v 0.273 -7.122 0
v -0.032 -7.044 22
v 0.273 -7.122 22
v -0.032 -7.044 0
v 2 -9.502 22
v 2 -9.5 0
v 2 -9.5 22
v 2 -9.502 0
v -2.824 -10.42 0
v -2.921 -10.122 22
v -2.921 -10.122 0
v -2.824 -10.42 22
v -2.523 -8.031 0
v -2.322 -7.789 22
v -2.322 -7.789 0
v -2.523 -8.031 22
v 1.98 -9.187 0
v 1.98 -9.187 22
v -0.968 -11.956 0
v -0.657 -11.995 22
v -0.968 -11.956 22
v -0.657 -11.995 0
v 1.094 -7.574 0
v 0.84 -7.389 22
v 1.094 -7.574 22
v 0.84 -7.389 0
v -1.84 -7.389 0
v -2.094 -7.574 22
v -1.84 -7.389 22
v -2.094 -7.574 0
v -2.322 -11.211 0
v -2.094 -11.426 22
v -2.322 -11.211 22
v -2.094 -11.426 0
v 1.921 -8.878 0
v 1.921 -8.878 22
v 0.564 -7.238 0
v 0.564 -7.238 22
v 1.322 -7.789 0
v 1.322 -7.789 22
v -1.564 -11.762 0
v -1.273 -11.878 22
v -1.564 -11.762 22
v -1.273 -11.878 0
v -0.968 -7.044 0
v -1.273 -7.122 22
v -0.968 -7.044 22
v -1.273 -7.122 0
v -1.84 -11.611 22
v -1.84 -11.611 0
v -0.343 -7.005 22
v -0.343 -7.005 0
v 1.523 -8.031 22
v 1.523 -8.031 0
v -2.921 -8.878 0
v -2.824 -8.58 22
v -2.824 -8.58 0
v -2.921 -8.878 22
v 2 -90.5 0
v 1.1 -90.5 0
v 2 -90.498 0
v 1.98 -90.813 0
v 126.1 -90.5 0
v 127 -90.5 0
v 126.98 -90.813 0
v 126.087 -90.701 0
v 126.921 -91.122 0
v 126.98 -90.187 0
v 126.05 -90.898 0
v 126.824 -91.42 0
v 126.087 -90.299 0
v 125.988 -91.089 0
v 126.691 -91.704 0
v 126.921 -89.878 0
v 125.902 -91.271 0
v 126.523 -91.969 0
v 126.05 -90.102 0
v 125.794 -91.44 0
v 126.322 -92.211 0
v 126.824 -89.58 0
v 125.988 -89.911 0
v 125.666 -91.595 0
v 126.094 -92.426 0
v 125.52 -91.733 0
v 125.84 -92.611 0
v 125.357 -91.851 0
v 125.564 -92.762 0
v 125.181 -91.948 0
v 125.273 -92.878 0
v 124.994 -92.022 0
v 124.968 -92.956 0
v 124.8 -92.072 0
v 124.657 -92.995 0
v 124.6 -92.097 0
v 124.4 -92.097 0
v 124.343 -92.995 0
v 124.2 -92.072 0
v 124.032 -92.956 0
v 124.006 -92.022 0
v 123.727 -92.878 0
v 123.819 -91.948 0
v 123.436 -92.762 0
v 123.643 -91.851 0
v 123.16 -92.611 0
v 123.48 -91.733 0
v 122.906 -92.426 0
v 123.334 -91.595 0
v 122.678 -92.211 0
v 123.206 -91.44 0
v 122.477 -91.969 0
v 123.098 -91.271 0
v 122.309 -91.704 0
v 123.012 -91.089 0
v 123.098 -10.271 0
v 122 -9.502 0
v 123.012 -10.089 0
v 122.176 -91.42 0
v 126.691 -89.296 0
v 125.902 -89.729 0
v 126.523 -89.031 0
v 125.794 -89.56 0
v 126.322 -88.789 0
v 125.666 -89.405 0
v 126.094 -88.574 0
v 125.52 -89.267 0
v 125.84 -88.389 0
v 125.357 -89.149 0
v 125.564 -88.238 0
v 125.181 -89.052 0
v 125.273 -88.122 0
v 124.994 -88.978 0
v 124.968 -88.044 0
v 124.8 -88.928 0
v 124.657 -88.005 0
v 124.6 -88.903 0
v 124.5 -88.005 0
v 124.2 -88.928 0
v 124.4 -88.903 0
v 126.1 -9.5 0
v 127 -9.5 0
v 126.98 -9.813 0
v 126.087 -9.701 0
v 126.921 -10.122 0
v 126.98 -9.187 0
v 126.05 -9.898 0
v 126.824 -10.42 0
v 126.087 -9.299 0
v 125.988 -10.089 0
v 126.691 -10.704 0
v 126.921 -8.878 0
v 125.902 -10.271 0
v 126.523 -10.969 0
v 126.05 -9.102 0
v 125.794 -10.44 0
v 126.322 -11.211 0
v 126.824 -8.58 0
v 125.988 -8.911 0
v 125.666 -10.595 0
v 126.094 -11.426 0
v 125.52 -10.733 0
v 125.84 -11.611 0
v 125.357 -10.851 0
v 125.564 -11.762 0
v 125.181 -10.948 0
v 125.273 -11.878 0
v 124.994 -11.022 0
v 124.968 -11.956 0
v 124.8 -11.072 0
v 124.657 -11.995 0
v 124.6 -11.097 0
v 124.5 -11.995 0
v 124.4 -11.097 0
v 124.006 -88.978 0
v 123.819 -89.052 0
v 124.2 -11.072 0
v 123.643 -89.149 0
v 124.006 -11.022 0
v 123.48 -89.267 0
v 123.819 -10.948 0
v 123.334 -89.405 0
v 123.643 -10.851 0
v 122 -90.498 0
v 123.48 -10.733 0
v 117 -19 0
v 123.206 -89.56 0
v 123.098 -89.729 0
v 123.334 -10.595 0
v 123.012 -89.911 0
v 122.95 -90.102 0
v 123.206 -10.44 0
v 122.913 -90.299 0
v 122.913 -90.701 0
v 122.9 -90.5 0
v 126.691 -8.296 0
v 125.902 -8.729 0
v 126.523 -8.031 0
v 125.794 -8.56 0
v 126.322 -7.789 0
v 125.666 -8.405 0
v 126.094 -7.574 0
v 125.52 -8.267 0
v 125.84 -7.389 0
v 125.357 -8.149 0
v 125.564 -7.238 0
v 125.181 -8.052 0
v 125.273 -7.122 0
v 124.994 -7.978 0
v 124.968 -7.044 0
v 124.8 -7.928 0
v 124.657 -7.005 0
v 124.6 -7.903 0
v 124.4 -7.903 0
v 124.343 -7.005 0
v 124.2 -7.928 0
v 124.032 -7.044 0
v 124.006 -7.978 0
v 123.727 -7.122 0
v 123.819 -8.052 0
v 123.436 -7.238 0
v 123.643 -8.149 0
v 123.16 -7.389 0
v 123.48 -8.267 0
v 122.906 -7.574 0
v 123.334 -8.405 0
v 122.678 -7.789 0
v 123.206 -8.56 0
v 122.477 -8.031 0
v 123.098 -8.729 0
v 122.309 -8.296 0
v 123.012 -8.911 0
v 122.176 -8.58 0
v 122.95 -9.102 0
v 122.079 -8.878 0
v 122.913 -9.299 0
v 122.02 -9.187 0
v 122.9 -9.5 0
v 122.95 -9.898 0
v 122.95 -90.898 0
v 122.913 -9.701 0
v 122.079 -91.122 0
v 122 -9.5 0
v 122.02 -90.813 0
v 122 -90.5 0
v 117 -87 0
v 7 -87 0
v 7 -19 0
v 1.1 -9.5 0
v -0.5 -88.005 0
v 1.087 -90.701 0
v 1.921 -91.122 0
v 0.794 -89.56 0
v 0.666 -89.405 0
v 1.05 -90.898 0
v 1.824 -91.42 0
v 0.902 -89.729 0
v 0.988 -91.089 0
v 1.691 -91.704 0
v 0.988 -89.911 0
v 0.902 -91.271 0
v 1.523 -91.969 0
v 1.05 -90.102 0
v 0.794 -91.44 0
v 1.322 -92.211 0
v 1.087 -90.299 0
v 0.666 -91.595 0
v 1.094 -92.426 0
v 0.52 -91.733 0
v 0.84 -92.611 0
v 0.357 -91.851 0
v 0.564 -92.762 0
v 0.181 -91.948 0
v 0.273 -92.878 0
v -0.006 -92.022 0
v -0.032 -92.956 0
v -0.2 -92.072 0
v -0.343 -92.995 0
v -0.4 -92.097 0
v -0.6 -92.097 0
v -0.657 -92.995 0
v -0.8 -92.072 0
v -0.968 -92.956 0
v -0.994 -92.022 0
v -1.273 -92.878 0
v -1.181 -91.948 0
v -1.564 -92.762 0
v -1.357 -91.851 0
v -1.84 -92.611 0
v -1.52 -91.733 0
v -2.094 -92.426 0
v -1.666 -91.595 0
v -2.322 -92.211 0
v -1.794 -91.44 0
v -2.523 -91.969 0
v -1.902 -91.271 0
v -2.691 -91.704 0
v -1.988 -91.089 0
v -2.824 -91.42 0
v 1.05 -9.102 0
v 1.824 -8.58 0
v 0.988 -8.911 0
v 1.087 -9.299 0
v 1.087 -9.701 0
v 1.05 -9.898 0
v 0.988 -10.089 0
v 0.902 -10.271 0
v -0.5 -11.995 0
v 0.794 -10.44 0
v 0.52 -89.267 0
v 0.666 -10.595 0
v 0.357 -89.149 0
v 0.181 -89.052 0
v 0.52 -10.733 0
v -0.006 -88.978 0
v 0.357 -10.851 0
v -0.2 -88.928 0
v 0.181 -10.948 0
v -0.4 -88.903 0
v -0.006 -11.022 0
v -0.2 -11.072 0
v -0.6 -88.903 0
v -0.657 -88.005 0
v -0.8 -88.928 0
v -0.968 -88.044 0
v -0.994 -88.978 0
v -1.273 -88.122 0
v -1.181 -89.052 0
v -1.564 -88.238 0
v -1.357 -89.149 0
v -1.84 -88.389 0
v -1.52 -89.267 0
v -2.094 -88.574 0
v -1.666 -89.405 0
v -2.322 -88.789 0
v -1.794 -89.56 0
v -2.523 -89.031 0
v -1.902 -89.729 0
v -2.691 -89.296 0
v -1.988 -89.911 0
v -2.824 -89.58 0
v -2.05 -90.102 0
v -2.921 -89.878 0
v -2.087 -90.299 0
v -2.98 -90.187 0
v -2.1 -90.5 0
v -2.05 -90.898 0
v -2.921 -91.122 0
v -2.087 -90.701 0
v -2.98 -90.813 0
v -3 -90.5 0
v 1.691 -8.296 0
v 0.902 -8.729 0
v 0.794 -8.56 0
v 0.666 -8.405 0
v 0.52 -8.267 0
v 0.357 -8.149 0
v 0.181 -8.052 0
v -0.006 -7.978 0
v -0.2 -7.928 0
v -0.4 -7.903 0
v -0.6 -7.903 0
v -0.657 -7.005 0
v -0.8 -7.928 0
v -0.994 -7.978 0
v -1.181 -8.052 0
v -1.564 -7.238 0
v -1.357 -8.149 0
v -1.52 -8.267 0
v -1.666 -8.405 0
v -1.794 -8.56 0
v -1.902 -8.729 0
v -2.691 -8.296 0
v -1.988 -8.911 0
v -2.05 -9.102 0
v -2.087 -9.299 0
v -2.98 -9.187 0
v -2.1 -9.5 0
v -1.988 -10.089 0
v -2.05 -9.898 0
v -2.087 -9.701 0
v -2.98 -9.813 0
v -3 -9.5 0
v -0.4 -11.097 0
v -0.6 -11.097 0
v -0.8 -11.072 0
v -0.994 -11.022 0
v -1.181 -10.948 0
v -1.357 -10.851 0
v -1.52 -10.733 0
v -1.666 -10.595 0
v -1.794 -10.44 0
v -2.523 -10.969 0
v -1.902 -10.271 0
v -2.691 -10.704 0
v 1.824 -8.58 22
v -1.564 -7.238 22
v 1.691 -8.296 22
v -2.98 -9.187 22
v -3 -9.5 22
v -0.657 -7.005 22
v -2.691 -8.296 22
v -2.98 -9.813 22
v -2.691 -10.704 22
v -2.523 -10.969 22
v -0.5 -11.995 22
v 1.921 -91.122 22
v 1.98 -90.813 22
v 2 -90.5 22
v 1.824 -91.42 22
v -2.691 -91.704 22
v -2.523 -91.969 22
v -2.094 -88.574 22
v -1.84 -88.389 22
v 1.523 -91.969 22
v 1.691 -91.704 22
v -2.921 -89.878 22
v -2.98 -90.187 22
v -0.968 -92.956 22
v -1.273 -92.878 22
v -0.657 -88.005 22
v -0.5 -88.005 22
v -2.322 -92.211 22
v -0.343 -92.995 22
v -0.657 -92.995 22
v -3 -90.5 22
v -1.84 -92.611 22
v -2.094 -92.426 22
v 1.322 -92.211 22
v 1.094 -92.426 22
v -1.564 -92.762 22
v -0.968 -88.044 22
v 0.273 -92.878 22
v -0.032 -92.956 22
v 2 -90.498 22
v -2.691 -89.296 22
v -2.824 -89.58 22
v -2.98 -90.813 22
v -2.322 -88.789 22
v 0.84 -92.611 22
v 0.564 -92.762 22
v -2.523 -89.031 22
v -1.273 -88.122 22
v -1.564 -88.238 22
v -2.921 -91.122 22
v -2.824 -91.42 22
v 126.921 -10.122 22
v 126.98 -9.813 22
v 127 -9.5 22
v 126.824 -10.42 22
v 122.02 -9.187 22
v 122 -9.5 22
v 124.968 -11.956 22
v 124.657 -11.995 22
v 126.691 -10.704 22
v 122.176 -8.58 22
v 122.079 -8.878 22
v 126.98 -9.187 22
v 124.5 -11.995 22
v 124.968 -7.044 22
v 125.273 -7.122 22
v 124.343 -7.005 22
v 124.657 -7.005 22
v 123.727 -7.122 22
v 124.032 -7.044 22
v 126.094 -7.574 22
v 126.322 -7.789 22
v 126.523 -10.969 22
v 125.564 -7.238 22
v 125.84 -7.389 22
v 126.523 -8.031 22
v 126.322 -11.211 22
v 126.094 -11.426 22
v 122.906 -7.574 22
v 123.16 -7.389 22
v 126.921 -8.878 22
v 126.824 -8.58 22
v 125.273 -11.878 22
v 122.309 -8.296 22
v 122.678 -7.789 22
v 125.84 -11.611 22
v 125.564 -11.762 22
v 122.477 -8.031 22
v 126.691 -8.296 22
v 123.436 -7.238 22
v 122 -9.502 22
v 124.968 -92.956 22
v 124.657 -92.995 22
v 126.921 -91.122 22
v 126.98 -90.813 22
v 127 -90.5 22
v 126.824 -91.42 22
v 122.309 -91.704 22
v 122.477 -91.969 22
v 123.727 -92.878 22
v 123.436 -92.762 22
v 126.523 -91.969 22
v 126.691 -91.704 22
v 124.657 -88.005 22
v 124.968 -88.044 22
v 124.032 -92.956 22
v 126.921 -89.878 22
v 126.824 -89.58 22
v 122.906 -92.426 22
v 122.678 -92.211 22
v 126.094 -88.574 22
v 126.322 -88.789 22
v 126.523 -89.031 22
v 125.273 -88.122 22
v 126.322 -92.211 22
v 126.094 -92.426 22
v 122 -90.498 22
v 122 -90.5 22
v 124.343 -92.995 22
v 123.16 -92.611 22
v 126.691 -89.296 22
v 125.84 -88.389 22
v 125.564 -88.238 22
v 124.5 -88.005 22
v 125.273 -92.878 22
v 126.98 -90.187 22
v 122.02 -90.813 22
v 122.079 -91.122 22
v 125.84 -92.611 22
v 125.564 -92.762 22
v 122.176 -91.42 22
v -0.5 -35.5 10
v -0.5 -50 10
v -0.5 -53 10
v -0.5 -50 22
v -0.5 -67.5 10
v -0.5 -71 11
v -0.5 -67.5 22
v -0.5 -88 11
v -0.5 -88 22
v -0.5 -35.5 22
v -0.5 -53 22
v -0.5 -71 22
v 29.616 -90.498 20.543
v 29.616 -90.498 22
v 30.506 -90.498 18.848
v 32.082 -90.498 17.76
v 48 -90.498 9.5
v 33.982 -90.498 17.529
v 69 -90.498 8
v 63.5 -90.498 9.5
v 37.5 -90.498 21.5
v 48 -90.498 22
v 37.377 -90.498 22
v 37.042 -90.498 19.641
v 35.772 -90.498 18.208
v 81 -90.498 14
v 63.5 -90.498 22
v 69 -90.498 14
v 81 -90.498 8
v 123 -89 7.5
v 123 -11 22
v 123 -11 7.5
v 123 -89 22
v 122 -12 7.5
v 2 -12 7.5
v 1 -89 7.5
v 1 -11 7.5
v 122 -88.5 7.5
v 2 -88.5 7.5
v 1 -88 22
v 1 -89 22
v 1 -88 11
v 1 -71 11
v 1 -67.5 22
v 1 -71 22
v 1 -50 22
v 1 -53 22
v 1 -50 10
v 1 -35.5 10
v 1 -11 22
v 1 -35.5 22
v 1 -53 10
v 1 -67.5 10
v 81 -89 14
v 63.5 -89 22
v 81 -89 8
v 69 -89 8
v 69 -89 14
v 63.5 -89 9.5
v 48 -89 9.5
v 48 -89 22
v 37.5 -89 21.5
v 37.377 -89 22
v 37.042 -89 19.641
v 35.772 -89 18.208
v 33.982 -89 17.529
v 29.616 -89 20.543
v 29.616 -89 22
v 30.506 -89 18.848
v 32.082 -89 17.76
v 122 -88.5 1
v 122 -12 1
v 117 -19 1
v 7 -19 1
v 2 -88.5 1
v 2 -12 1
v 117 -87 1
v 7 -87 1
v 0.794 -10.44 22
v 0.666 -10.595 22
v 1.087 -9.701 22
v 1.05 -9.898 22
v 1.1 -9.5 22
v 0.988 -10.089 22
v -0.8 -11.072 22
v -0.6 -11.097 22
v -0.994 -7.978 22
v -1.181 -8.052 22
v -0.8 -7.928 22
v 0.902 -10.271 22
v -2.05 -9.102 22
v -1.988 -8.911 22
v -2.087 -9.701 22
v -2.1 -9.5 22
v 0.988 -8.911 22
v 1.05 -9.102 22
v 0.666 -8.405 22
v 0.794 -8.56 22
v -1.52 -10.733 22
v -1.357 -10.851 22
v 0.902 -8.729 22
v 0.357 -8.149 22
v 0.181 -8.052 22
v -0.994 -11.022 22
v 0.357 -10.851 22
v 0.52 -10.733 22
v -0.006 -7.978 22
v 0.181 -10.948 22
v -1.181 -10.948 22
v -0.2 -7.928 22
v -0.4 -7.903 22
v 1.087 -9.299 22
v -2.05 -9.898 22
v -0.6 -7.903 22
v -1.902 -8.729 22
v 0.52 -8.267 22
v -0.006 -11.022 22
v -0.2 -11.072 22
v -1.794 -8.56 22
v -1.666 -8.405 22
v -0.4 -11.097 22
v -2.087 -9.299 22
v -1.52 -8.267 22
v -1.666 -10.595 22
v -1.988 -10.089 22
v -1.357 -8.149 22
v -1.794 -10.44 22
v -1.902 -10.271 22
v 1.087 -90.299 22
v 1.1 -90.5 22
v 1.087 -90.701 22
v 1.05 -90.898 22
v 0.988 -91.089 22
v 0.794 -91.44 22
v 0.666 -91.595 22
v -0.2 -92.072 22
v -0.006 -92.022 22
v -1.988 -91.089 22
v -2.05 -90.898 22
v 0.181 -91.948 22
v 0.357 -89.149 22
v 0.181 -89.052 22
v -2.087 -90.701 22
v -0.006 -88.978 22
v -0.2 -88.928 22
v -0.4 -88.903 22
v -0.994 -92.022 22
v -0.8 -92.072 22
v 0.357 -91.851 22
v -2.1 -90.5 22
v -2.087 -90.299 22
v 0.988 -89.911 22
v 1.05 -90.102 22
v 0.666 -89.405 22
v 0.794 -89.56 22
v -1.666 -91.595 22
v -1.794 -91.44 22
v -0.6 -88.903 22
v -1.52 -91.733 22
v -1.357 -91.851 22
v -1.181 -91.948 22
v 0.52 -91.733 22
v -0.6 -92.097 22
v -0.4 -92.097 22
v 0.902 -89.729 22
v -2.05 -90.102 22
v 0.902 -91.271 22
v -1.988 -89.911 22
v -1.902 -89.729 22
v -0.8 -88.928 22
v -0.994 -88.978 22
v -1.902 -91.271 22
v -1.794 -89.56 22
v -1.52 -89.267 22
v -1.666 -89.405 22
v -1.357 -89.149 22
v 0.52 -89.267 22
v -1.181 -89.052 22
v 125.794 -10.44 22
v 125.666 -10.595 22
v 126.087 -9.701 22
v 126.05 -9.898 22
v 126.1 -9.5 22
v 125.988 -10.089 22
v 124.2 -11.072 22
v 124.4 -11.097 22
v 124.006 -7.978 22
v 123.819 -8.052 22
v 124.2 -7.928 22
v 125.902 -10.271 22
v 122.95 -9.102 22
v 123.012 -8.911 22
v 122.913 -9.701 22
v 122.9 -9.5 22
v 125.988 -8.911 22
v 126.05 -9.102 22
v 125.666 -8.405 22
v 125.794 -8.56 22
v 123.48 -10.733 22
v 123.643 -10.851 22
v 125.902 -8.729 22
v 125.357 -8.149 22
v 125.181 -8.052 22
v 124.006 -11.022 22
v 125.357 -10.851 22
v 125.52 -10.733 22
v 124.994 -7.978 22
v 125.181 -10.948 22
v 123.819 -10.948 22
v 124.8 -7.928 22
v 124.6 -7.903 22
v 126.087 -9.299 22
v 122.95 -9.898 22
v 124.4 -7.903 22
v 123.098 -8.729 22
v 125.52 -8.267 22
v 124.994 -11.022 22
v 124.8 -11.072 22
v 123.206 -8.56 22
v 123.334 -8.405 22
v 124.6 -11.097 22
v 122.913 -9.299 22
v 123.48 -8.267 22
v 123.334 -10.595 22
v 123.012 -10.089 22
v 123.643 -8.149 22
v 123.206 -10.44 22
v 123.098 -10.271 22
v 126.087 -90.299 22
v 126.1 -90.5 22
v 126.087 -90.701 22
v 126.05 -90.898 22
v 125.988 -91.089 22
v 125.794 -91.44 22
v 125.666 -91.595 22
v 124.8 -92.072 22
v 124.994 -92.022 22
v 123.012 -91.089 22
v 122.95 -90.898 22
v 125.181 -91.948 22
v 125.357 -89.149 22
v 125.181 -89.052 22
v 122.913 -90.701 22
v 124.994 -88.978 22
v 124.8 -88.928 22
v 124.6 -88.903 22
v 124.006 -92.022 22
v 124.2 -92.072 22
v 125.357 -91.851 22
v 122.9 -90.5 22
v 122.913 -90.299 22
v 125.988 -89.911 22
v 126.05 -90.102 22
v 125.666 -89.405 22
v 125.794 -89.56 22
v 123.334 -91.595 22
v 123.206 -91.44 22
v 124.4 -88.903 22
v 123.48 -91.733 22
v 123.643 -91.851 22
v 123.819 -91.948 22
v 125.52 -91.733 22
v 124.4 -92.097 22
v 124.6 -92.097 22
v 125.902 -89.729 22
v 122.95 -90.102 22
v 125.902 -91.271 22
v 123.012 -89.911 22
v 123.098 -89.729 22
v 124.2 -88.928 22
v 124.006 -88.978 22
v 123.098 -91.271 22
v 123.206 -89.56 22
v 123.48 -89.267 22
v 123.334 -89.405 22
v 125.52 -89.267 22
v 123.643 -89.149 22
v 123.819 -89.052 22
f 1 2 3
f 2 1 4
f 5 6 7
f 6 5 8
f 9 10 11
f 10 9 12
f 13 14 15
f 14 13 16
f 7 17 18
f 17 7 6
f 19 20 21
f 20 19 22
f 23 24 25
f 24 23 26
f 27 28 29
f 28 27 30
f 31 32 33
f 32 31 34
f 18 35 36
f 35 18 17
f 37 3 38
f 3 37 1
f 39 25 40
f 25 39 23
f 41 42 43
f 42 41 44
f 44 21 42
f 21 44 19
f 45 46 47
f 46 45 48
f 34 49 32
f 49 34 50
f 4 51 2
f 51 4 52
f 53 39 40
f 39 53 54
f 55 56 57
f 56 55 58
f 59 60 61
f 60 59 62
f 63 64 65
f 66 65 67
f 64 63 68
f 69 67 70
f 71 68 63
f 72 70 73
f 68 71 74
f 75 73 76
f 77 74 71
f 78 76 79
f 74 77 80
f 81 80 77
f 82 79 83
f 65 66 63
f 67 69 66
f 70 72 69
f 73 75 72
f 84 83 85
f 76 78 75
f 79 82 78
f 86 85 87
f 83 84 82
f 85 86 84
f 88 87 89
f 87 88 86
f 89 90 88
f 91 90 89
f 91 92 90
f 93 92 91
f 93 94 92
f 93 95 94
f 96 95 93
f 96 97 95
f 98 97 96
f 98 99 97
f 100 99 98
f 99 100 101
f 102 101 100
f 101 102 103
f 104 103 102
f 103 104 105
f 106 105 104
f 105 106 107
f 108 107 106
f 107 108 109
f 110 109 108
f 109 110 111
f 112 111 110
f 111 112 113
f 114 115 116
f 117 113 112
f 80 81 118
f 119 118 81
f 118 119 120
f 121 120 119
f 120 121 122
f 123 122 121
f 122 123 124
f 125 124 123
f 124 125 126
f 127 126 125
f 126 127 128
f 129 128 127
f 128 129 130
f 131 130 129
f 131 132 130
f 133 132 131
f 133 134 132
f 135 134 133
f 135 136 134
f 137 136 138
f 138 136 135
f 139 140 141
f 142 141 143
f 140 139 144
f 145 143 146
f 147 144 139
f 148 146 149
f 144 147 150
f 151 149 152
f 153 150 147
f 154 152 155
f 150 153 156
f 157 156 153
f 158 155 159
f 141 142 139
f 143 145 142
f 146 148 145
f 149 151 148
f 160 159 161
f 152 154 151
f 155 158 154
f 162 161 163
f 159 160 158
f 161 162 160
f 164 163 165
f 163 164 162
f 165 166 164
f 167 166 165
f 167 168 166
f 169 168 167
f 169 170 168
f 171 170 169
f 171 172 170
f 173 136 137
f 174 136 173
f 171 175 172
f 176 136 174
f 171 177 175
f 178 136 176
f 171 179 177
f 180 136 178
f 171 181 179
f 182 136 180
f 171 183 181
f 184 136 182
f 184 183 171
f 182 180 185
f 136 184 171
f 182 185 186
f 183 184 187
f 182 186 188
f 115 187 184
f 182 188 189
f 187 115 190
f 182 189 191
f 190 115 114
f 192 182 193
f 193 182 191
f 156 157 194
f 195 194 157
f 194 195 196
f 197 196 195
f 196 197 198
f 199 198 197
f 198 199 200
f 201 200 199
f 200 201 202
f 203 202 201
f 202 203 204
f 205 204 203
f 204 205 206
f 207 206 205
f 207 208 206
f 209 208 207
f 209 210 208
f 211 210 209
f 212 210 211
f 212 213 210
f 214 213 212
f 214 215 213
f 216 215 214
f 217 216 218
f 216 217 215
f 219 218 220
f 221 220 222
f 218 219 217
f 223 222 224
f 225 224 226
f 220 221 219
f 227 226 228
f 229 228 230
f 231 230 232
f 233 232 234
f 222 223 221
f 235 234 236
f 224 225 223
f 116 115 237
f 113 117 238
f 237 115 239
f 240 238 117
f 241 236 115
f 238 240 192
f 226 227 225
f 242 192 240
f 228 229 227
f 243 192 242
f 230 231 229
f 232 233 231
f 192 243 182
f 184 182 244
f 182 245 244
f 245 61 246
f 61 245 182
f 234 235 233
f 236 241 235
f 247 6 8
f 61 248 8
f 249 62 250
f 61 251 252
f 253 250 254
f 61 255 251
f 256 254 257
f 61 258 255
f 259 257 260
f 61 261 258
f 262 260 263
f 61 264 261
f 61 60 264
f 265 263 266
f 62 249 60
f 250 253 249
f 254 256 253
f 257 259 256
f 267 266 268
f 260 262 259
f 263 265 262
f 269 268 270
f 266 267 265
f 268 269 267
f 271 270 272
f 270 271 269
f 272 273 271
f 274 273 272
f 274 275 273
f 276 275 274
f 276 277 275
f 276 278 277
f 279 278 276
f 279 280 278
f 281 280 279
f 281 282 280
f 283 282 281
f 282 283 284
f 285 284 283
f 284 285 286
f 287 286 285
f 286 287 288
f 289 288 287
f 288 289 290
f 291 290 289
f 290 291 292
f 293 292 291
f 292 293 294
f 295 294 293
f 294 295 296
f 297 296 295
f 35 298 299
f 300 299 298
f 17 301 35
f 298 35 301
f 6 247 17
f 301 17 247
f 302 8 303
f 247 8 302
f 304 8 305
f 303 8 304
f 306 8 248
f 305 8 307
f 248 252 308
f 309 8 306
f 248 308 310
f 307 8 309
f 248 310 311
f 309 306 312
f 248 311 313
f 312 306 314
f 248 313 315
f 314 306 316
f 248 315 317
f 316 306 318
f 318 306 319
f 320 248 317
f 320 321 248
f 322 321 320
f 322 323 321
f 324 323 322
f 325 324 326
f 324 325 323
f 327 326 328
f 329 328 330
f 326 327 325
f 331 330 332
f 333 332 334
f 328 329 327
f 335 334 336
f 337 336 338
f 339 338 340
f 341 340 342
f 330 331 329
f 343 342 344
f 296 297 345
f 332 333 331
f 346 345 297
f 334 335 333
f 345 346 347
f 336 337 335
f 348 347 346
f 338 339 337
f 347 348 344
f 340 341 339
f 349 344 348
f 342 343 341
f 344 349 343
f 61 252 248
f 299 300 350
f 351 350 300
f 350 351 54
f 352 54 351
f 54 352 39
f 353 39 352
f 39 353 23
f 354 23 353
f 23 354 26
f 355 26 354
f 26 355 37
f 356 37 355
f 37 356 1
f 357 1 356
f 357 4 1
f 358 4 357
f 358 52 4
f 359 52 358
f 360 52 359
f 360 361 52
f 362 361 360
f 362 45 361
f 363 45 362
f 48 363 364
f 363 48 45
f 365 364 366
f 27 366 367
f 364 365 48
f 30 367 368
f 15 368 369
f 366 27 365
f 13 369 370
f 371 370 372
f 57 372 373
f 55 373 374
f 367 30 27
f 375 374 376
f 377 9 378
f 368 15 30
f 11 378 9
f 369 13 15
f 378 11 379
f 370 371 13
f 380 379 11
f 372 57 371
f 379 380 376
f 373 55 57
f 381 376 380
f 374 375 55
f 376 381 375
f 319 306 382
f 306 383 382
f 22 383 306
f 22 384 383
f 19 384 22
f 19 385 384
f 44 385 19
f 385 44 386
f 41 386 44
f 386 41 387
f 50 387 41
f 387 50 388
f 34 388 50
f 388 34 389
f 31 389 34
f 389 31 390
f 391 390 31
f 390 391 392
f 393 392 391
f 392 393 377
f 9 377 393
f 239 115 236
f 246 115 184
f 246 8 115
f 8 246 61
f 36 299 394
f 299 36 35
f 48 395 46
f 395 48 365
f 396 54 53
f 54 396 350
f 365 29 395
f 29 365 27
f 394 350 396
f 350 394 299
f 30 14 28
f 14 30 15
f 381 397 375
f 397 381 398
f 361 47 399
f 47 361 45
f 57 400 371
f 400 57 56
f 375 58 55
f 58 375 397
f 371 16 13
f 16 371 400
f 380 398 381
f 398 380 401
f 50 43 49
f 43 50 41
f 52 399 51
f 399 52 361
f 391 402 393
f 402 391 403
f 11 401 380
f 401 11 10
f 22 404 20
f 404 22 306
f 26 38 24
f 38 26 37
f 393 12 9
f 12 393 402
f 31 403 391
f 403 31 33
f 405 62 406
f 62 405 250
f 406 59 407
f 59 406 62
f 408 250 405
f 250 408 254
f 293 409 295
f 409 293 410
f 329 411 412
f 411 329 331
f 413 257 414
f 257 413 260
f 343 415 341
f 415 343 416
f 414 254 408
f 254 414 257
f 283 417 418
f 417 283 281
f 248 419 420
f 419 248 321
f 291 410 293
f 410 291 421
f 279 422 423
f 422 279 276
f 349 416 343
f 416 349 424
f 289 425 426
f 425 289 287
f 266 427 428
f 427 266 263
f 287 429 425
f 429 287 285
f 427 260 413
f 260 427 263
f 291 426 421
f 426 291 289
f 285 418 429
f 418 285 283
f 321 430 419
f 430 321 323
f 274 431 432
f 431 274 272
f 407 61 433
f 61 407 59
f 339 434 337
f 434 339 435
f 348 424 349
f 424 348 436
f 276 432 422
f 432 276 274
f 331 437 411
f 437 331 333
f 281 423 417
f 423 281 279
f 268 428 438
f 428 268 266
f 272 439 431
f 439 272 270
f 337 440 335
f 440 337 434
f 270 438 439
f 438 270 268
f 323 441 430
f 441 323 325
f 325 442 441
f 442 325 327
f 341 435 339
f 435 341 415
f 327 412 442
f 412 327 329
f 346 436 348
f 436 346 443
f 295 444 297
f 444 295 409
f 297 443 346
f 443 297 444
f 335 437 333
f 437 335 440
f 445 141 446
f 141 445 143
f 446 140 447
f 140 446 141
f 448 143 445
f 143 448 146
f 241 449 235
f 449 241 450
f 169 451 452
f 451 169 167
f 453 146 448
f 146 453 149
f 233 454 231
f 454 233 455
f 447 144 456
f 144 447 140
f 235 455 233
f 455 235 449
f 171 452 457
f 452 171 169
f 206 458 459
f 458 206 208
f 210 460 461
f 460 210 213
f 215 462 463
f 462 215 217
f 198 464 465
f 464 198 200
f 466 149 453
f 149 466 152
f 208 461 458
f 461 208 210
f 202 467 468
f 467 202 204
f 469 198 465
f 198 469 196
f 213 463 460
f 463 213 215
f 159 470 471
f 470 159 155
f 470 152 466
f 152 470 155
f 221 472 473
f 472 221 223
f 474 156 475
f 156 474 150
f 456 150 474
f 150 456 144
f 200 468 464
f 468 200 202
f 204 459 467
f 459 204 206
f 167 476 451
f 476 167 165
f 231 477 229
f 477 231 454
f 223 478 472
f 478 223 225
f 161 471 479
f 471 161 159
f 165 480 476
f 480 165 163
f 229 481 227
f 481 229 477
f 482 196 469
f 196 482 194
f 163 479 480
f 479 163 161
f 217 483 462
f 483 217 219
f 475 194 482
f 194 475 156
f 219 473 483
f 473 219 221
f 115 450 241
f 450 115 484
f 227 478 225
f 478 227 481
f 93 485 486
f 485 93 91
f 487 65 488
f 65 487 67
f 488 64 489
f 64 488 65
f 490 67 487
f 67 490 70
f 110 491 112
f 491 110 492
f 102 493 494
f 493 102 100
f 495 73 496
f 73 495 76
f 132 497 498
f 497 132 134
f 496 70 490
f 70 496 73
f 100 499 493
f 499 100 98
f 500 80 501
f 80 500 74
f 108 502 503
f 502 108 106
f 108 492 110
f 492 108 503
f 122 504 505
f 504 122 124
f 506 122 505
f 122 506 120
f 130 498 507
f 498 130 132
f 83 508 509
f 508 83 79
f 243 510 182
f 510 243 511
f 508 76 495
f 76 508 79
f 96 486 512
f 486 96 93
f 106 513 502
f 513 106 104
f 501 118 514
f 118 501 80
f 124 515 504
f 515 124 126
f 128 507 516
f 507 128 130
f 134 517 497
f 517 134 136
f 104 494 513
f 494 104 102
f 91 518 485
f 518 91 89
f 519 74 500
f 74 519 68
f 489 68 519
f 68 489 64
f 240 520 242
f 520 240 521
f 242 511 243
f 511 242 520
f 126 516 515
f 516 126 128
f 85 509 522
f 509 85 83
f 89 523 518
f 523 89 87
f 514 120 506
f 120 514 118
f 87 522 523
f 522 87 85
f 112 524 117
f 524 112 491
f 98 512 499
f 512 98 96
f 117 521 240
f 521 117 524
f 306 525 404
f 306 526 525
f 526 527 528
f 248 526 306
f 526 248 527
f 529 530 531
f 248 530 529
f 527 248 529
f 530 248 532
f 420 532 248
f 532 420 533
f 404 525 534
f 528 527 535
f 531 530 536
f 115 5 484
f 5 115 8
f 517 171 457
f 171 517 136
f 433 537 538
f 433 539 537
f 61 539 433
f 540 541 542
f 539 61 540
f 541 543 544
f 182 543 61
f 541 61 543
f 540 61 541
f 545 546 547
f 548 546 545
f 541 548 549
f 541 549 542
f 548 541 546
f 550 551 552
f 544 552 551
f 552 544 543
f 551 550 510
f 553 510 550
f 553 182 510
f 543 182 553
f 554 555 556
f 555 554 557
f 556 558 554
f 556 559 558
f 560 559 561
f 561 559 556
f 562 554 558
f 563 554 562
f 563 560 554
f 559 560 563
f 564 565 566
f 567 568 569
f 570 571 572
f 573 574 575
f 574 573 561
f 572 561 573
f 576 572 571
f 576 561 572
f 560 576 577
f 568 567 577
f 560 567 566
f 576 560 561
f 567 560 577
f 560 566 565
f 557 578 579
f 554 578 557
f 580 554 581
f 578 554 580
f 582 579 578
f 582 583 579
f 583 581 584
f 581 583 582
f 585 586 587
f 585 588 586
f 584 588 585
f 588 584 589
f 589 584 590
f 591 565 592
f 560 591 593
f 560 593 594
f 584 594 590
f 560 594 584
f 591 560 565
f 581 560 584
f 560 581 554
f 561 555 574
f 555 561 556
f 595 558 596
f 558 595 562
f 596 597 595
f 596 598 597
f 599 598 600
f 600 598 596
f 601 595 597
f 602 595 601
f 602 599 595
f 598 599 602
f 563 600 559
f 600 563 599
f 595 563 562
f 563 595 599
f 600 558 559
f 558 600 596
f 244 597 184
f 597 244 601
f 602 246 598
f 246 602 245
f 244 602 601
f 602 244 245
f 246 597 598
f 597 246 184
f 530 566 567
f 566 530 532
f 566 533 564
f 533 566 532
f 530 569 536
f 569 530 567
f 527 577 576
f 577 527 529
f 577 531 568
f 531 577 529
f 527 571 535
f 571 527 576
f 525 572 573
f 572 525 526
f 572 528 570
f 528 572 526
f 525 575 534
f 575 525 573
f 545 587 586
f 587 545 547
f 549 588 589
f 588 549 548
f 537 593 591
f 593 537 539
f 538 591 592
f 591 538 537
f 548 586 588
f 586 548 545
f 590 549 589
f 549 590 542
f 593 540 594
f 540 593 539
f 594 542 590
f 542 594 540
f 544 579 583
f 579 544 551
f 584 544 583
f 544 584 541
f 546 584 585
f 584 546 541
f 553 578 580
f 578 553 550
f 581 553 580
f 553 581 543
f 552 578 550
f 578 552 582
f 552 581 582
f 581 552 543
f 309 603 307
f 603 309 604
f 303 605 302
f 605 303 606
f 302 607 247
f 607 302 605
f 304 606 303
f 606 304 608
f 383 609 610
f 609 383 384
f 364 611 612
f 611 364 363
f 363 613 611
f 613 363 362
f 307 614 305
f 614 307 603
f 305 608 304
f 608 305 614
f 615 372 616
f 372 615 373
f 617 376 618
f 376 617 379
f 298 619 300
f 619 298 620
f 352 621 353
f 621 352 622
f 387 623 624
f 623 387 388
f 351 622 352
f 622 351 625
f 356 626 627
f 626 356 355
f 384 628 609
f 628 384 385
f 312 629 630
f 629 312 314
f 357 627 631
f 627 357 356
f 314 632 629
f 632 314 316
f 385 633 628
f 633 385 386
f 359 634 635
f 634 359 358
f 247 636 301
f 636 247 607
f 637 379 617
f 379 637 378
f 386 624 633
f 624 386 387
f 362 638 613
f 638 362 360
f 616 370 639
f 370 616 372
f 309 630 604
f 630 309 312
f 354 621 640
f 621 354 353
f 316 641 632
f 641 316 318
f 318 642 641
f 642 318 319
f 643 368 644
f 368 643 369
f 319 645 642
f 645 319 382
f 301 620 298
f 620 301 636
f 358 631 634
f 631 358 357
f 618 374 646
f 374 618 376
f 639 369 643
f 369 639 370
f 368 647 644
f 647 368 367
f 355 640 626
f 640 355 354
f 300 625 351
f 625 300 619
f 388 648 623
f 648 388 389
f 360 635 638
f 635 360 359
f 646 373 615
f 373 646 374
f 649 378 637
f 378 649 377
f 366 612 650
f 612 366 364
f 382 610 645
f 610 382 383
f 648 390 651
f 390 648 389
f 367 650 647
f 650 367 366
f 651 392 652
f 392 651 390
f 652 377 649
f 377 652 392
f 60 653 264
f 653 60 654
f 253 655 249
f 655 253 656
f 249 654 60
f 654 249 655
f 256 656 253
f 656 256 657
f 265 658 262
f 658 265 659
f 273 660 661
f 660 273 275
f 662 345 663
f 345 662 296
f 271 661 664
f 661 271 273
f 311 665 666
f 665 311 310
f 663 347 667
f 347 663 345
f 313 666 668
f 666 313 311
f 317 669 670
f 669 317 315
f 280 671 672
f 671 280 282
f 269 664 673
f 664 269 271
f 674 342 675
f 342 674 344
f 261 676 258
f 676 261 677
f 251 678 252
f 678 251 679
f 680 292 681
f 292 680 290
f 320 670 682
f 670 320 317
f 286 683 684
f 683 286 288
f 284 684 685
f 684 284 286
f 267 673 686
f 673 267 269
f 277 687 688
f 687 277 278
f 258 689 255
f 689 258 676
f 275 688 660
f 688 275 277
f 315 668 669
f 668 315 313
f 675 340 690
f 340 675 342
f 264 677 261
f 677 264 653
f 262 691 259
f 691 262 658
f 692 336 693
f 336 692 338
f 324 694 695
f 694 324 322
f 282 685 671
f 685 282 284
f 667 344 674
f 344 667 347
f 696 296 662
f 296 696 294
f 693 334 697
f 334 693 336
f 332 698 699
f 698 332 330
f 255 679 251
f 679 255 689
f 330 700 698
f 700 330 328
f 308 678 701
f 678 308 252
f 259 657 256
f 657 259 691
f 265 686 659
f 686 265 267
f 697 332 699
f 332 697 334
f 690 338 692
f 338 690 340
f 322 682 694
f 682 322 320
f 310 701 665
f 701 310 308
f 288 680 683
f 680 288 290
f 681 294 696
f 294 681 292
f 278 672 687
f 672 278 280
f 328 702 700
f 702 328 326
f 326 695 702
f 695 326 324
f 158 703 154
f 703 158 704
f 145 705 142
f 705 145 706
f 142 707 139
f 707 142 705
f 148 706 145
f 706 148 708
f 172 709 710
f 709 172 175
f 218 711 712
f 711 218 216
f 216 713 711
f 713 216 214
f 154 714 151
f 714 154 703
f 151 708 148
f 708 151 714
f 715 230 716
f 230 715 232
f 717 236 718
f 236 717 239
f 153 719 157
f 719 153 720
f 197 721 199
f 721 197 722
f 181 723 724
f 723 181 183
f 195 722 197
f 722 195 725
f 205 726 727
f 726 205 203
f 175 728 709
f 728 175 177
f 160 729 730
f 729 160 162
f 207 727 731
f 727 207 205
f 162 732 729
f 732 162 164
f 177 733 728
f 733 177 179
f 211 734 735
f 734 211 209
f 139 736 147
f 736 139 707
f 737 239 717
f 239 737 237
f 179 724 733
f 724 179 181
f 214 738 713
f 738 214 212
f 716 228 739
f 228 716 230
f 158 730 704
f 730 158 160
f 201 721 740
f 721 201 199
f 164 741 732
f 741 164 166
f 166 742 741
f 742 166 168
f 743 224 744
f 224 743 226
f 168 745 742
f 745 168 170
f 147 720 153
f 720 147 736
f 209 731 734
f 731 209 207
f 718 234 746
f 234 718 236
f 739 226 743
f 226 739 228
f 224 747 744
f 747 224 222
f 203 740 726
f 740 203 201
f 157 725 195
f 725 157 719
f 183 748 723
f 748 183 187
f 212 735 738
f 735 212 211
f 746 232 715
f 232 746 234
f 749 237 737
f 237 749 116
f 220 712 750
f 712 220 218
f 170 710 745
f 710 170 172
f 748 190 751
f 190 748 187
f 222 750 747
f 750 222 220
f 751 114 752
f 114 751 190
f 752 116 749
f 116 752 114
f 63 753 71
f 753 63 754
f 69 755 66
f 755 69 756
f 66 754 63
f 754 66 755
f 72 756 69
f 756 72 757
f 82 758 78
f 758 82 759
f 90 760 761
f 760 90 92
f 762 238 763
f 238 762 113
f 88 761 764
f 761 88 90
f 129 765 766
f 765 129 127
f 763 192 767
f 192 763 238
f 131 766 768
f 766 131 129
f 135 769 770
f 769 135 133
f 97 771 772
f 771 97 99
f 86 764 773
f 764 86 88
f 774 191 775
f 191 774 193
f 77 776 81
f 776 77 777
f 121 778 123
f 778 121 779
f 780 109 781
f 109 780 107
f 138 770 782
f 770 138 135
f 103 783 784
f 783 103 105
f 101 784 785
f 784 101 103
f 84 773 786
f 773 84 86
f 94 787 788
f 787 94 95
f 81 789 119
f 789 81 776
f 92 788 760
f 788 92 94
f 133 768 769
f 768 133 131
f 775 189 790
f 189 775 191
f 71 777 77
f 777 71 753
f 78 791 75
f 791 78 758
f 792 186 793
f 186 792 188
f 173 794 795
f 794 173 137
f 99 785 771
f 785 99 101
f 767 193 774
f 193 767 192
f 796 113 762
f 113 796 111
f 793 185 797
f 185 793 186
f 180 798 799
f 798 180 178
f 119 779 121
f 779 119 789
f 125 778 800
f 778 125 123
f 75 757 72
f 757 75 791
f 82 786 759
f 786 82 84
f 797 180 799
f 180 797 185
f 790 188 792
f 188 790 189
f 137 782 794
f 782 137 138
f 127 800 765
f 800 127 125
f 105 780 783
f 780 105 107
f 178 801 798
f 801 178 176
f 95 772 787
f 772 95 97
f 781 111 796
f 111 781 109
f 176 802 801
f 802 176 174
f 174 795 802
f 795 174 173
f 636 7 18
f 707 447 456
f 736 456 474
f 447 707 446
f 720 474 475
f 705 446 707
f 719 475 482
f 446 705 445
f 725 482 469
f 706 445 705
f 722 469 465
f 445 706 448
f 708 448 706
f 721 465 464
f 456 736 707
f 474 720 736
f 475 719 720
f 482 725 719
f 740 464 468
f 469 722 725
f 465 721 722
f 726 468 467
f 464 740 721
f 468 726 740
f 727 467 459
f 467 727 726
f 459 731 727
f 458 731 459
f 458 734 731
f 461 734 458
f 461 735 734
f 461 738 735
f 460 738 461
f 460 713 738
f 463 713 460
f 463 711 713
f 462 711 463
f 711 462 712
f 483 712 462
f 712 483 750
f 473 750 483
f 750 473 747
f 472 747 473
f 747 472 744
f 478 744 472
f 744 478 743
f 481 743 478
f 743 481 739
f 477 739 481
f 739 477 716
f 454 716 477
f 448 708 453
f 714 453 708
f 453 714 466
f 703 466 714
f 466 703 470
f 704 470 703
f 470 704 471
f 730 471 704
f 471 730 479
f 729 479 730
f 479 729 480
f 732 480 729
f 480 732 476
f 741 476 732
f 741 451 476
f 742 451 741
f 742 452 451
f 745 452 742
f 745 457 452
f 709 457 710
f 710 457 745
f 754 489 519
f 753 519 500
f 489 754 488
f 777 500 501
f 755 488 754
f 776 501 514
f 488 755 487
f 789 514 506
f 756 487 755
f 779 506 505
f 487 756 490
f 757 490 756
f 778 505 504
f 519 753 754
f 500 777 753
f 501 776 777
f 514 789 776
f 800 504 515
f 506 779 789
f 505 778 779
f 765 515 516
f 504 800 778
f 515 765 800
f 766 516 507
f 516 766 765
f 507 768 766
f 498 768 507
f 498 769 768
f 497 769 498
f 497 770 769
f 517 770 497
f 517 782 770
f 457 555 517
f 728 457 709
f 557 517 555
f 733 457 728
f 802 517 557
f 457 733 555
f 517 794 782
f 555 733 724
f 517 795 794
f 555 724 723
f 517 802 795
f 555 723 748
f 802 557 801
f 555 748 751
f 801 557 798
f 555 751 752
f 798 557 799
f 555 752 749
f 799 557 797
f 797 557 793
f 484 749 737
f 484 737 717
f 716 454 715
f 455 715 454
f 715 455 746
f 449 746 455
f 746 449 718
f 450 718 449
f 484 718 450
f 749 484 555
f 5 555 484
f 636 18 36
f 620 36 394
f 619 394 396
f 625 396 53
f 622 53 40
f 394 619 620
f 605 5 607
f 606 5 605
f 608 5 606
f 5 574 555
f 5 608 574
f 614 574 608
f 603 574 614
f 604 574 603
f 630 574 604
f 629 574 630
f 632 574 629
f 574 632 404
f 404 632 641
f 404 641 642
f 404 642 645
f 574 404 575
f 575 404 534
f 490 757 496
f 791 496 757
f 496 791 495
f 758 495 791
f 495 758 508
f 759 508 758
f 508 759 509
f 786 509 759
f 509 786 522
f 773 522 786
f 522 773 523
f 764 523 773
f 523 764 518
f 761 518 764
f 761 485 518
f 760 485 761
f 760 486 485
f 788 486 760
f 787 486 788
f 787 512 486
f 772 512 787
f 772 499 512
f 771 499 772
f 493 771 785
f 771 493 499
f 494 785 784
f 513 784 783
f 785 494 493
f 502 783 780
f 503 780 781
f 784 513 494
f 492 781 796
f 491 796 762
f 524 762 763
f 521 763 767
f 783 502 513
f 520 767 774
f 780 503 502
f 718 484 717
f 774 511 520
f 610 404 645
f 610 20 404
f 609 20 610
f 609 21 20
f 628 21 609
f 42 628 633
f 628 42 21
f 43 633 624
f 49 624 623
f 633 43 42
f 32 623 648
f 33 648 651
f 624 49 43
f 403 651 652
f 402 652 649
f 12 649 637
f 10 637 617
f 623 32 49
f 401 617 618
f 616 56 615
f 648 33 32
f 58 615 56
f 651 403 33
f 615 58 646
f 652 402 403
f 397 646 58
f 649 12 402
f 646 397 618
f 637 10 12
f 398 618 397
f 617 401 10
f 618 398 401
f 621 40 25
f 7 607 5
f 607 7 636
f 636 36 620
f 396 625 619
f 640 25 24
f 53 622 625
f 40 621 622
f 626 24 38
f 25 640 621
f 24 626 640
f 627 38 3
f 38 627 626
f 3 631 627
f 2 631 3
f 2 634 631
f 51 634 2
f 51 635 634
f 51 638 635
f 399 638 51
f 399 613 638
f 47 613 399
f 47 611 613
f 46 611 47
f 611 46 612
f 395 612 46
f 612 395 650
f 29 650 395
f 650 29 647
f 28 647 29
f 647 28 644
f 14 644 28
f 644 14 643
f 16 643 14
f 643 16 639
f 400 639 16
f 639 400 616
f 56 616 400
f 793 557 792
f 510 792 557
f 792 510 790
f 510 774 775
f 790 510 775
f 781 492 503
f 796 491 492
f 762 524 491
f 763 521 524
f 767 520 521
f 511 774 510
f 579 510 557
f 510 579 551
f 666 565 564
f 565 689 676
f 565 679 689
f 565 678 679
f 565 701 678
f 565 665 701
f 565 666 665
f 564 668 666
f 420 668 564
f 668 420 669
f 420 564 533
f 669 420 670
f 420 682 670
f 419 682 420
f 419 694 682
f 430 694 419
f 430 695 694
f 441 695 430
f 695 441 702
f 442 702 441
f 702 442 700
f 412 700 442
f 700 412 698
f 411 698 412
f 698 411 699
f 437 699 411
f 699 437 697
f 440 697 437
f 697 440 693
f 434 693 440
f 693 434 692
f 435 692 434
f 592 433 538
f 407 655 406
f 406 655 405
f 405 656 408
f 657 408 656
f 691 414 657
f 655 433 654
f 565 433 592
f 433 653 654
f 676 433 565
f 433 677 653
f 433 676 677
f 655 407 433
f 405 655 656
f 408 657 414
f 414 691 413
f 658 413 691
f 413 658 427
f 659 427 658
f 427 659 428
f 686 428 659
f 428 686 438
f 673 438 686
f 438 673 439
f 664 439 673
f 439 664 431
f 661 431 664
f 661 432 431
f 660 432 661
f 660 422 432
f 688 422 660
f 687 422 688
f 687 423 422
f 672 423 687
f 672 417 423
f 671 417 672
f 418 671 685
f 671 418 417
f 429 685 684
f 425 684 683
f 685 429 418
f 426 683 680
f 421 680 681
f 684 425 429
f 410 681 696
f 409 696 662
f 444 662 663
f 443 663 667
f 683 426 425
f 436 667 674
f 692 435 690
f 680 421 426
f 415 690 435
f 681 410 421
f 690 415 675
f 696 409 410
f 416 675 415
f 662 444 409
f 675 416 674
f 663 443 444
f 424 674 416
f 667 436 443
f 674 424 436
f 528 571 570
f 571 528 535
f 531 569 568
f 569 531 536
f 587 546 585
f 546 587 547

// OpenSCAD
clearance               = 0.2;

pcb_length              = 122;
pcb_width               = 78;
pcb_thickness           = 1.5;
pcb_bottom_clearance    = 8.5;
components_clearance    = 20.5;

headphone_hole_offset_x = 32.5;
headphone_hole_offset_z = 14;
headphone_hole_dia      = 8;

screen_offset_x         = 6;
screen_offset_y         = 8;
screen_length           = 110;
screen_width            = 68;
screen_frame_length     = 120;
screen_frame_width      = 76.5;
screen_frame_thickness  = 6.5;

rj45_width              = 17;
rj45_height             = 14.5;
rj45_offset_y           = 60;
rj45_offset_z           = 18;

usb_width               = 14.5;
usb_height              = 15.5;
usb_offset_y            = 42;
usb_offset_z            = 18;

hdmi_width              = 15.5;
hdmi_height             = 15;
hdmi_offset_x           = 47;
hdmi_offset_z           = 17;

microusb_offset_x       = 68;
microusb_offset_z       = 6.5;
microusb_width          = 12;
microusb_height         = 6;

second_usb_offset_y     = 24.5;

wall_thickness          = 1;
pcb_shelf_width         = 1;
total_height            = pcb_thickness + pcb_bottom_clearance + components_clearance;
top_case_height         = 22;

module raspberry_plus_screen() {
    translate([0, 0, pcb_thickness + components_clearance]) {
        translate([0, 0, -pcb_thickness])
             cube([pcb_length, pcb_width, pcb_thickness]);
        translate([0, 0, -pcb_thickness - components_clearance])
             cube([pcb_length, pcb_width, components_clearance]);
        translate([1, 1, 0])
             cube([screen_frame_length, screen_frame_width, screen_frame_thickness]);
        translate([screen_offset_x, screen_offset_y, screen_frame_thickness])
            cube([screen_length, screen_width, wall_thickness +1]);
        translate([-5, rj45_offset_y, -rj45_offset_z])
            cube([5, rj45_width, rj45_height]);
        translate([-5, usb_offset_y, -usb_offset_z])
            cube([5, usb_width, usb_height]);
        translate([-5, second_usb_offset_y, -usb_offset_z])
            cube([5, usb_width, usb_height]);
        translate([headphone_hole_offset_x, pcb_width, -headphone_hole_offset_z])
            rotate([-90, 0, 0]) cylinder(d=headphone_hole_dia, h=5);
        translate([hdmi_offset_x, pcb_width, -hdmi_offset_z])
            cube([hdmi_width, 5, hdmi_height]);
        translate([microusb_offset_x, pcb_width, -microusb_offset_z])
            cube([microusb_width, 5, microusb_height]);
    }
}


module roundrect(size, radius = 1) {
    x = size[0];
    y = size[1];
    z = size[2];

    translate([x/2, y/2, 0]) linear_extrude(height=z)
        hull() {
            translate([(-x/2)+(radius/2), (-y/2)+(radius/2), 0])
                circle(r=radius, $fn=50);

            translate([(x/2)-(radius/2), (-y/2)+(radius/2), 0])
                circle(r=radius, $fn=50);

            translate([(-x/2)+(radius/2), (y/2)-(radius/2), 0])
                circle(r=radius, $fn=50);

            translate([(x/2)-(radius/2), (y/2)-(radius/2), 0])
                circle(r=radius, $fn=50);
        }
}

module case() {
    difference() {
        union() {
            translate([0, 0, -wall_thickness])
                roundrect([pcb_length + wall_thickness * 2,
                           pcb_width + wall_thickness * 2,
                           total_height], wall_thickness);
                for(i=[-0.5, pcb_length + 2.5])
                    for(j=[-0.5, pcb_width + 2.5])
                        translate([i, j, -wall_thickness])
                                cylinder(d=5, h=total_height, $fn=50);
        }
        translate([wall_thickness, wall_thickness, 0]) raspberry_plus_screen();
        for(i=[-0.5, pcb_length + 2.5])
            for(j=[-0.5, pcb_width + 2.5])
                translate([i, j, -wall_thickness])
                    cylinder(d=3 + clearance, h=total_height, $fn=50);
    }
}


module top_case() {
    difference() {
        case();
        translate([-10, -10, -wall_thickness]) cube([300, 300, total_height - top_case_height]);
    }
}

module bottom_case() {
    difference() {
        case();
        translate([-10, -10, total_height - top_case_height]) cube([300, 300, total_height]);
    }
}

translate([0, -10, total_height - wall_thickness]) rotate([180, 0, 0]) top_case();
//translate([0, 10, wall_thickness]) bottom_case();
